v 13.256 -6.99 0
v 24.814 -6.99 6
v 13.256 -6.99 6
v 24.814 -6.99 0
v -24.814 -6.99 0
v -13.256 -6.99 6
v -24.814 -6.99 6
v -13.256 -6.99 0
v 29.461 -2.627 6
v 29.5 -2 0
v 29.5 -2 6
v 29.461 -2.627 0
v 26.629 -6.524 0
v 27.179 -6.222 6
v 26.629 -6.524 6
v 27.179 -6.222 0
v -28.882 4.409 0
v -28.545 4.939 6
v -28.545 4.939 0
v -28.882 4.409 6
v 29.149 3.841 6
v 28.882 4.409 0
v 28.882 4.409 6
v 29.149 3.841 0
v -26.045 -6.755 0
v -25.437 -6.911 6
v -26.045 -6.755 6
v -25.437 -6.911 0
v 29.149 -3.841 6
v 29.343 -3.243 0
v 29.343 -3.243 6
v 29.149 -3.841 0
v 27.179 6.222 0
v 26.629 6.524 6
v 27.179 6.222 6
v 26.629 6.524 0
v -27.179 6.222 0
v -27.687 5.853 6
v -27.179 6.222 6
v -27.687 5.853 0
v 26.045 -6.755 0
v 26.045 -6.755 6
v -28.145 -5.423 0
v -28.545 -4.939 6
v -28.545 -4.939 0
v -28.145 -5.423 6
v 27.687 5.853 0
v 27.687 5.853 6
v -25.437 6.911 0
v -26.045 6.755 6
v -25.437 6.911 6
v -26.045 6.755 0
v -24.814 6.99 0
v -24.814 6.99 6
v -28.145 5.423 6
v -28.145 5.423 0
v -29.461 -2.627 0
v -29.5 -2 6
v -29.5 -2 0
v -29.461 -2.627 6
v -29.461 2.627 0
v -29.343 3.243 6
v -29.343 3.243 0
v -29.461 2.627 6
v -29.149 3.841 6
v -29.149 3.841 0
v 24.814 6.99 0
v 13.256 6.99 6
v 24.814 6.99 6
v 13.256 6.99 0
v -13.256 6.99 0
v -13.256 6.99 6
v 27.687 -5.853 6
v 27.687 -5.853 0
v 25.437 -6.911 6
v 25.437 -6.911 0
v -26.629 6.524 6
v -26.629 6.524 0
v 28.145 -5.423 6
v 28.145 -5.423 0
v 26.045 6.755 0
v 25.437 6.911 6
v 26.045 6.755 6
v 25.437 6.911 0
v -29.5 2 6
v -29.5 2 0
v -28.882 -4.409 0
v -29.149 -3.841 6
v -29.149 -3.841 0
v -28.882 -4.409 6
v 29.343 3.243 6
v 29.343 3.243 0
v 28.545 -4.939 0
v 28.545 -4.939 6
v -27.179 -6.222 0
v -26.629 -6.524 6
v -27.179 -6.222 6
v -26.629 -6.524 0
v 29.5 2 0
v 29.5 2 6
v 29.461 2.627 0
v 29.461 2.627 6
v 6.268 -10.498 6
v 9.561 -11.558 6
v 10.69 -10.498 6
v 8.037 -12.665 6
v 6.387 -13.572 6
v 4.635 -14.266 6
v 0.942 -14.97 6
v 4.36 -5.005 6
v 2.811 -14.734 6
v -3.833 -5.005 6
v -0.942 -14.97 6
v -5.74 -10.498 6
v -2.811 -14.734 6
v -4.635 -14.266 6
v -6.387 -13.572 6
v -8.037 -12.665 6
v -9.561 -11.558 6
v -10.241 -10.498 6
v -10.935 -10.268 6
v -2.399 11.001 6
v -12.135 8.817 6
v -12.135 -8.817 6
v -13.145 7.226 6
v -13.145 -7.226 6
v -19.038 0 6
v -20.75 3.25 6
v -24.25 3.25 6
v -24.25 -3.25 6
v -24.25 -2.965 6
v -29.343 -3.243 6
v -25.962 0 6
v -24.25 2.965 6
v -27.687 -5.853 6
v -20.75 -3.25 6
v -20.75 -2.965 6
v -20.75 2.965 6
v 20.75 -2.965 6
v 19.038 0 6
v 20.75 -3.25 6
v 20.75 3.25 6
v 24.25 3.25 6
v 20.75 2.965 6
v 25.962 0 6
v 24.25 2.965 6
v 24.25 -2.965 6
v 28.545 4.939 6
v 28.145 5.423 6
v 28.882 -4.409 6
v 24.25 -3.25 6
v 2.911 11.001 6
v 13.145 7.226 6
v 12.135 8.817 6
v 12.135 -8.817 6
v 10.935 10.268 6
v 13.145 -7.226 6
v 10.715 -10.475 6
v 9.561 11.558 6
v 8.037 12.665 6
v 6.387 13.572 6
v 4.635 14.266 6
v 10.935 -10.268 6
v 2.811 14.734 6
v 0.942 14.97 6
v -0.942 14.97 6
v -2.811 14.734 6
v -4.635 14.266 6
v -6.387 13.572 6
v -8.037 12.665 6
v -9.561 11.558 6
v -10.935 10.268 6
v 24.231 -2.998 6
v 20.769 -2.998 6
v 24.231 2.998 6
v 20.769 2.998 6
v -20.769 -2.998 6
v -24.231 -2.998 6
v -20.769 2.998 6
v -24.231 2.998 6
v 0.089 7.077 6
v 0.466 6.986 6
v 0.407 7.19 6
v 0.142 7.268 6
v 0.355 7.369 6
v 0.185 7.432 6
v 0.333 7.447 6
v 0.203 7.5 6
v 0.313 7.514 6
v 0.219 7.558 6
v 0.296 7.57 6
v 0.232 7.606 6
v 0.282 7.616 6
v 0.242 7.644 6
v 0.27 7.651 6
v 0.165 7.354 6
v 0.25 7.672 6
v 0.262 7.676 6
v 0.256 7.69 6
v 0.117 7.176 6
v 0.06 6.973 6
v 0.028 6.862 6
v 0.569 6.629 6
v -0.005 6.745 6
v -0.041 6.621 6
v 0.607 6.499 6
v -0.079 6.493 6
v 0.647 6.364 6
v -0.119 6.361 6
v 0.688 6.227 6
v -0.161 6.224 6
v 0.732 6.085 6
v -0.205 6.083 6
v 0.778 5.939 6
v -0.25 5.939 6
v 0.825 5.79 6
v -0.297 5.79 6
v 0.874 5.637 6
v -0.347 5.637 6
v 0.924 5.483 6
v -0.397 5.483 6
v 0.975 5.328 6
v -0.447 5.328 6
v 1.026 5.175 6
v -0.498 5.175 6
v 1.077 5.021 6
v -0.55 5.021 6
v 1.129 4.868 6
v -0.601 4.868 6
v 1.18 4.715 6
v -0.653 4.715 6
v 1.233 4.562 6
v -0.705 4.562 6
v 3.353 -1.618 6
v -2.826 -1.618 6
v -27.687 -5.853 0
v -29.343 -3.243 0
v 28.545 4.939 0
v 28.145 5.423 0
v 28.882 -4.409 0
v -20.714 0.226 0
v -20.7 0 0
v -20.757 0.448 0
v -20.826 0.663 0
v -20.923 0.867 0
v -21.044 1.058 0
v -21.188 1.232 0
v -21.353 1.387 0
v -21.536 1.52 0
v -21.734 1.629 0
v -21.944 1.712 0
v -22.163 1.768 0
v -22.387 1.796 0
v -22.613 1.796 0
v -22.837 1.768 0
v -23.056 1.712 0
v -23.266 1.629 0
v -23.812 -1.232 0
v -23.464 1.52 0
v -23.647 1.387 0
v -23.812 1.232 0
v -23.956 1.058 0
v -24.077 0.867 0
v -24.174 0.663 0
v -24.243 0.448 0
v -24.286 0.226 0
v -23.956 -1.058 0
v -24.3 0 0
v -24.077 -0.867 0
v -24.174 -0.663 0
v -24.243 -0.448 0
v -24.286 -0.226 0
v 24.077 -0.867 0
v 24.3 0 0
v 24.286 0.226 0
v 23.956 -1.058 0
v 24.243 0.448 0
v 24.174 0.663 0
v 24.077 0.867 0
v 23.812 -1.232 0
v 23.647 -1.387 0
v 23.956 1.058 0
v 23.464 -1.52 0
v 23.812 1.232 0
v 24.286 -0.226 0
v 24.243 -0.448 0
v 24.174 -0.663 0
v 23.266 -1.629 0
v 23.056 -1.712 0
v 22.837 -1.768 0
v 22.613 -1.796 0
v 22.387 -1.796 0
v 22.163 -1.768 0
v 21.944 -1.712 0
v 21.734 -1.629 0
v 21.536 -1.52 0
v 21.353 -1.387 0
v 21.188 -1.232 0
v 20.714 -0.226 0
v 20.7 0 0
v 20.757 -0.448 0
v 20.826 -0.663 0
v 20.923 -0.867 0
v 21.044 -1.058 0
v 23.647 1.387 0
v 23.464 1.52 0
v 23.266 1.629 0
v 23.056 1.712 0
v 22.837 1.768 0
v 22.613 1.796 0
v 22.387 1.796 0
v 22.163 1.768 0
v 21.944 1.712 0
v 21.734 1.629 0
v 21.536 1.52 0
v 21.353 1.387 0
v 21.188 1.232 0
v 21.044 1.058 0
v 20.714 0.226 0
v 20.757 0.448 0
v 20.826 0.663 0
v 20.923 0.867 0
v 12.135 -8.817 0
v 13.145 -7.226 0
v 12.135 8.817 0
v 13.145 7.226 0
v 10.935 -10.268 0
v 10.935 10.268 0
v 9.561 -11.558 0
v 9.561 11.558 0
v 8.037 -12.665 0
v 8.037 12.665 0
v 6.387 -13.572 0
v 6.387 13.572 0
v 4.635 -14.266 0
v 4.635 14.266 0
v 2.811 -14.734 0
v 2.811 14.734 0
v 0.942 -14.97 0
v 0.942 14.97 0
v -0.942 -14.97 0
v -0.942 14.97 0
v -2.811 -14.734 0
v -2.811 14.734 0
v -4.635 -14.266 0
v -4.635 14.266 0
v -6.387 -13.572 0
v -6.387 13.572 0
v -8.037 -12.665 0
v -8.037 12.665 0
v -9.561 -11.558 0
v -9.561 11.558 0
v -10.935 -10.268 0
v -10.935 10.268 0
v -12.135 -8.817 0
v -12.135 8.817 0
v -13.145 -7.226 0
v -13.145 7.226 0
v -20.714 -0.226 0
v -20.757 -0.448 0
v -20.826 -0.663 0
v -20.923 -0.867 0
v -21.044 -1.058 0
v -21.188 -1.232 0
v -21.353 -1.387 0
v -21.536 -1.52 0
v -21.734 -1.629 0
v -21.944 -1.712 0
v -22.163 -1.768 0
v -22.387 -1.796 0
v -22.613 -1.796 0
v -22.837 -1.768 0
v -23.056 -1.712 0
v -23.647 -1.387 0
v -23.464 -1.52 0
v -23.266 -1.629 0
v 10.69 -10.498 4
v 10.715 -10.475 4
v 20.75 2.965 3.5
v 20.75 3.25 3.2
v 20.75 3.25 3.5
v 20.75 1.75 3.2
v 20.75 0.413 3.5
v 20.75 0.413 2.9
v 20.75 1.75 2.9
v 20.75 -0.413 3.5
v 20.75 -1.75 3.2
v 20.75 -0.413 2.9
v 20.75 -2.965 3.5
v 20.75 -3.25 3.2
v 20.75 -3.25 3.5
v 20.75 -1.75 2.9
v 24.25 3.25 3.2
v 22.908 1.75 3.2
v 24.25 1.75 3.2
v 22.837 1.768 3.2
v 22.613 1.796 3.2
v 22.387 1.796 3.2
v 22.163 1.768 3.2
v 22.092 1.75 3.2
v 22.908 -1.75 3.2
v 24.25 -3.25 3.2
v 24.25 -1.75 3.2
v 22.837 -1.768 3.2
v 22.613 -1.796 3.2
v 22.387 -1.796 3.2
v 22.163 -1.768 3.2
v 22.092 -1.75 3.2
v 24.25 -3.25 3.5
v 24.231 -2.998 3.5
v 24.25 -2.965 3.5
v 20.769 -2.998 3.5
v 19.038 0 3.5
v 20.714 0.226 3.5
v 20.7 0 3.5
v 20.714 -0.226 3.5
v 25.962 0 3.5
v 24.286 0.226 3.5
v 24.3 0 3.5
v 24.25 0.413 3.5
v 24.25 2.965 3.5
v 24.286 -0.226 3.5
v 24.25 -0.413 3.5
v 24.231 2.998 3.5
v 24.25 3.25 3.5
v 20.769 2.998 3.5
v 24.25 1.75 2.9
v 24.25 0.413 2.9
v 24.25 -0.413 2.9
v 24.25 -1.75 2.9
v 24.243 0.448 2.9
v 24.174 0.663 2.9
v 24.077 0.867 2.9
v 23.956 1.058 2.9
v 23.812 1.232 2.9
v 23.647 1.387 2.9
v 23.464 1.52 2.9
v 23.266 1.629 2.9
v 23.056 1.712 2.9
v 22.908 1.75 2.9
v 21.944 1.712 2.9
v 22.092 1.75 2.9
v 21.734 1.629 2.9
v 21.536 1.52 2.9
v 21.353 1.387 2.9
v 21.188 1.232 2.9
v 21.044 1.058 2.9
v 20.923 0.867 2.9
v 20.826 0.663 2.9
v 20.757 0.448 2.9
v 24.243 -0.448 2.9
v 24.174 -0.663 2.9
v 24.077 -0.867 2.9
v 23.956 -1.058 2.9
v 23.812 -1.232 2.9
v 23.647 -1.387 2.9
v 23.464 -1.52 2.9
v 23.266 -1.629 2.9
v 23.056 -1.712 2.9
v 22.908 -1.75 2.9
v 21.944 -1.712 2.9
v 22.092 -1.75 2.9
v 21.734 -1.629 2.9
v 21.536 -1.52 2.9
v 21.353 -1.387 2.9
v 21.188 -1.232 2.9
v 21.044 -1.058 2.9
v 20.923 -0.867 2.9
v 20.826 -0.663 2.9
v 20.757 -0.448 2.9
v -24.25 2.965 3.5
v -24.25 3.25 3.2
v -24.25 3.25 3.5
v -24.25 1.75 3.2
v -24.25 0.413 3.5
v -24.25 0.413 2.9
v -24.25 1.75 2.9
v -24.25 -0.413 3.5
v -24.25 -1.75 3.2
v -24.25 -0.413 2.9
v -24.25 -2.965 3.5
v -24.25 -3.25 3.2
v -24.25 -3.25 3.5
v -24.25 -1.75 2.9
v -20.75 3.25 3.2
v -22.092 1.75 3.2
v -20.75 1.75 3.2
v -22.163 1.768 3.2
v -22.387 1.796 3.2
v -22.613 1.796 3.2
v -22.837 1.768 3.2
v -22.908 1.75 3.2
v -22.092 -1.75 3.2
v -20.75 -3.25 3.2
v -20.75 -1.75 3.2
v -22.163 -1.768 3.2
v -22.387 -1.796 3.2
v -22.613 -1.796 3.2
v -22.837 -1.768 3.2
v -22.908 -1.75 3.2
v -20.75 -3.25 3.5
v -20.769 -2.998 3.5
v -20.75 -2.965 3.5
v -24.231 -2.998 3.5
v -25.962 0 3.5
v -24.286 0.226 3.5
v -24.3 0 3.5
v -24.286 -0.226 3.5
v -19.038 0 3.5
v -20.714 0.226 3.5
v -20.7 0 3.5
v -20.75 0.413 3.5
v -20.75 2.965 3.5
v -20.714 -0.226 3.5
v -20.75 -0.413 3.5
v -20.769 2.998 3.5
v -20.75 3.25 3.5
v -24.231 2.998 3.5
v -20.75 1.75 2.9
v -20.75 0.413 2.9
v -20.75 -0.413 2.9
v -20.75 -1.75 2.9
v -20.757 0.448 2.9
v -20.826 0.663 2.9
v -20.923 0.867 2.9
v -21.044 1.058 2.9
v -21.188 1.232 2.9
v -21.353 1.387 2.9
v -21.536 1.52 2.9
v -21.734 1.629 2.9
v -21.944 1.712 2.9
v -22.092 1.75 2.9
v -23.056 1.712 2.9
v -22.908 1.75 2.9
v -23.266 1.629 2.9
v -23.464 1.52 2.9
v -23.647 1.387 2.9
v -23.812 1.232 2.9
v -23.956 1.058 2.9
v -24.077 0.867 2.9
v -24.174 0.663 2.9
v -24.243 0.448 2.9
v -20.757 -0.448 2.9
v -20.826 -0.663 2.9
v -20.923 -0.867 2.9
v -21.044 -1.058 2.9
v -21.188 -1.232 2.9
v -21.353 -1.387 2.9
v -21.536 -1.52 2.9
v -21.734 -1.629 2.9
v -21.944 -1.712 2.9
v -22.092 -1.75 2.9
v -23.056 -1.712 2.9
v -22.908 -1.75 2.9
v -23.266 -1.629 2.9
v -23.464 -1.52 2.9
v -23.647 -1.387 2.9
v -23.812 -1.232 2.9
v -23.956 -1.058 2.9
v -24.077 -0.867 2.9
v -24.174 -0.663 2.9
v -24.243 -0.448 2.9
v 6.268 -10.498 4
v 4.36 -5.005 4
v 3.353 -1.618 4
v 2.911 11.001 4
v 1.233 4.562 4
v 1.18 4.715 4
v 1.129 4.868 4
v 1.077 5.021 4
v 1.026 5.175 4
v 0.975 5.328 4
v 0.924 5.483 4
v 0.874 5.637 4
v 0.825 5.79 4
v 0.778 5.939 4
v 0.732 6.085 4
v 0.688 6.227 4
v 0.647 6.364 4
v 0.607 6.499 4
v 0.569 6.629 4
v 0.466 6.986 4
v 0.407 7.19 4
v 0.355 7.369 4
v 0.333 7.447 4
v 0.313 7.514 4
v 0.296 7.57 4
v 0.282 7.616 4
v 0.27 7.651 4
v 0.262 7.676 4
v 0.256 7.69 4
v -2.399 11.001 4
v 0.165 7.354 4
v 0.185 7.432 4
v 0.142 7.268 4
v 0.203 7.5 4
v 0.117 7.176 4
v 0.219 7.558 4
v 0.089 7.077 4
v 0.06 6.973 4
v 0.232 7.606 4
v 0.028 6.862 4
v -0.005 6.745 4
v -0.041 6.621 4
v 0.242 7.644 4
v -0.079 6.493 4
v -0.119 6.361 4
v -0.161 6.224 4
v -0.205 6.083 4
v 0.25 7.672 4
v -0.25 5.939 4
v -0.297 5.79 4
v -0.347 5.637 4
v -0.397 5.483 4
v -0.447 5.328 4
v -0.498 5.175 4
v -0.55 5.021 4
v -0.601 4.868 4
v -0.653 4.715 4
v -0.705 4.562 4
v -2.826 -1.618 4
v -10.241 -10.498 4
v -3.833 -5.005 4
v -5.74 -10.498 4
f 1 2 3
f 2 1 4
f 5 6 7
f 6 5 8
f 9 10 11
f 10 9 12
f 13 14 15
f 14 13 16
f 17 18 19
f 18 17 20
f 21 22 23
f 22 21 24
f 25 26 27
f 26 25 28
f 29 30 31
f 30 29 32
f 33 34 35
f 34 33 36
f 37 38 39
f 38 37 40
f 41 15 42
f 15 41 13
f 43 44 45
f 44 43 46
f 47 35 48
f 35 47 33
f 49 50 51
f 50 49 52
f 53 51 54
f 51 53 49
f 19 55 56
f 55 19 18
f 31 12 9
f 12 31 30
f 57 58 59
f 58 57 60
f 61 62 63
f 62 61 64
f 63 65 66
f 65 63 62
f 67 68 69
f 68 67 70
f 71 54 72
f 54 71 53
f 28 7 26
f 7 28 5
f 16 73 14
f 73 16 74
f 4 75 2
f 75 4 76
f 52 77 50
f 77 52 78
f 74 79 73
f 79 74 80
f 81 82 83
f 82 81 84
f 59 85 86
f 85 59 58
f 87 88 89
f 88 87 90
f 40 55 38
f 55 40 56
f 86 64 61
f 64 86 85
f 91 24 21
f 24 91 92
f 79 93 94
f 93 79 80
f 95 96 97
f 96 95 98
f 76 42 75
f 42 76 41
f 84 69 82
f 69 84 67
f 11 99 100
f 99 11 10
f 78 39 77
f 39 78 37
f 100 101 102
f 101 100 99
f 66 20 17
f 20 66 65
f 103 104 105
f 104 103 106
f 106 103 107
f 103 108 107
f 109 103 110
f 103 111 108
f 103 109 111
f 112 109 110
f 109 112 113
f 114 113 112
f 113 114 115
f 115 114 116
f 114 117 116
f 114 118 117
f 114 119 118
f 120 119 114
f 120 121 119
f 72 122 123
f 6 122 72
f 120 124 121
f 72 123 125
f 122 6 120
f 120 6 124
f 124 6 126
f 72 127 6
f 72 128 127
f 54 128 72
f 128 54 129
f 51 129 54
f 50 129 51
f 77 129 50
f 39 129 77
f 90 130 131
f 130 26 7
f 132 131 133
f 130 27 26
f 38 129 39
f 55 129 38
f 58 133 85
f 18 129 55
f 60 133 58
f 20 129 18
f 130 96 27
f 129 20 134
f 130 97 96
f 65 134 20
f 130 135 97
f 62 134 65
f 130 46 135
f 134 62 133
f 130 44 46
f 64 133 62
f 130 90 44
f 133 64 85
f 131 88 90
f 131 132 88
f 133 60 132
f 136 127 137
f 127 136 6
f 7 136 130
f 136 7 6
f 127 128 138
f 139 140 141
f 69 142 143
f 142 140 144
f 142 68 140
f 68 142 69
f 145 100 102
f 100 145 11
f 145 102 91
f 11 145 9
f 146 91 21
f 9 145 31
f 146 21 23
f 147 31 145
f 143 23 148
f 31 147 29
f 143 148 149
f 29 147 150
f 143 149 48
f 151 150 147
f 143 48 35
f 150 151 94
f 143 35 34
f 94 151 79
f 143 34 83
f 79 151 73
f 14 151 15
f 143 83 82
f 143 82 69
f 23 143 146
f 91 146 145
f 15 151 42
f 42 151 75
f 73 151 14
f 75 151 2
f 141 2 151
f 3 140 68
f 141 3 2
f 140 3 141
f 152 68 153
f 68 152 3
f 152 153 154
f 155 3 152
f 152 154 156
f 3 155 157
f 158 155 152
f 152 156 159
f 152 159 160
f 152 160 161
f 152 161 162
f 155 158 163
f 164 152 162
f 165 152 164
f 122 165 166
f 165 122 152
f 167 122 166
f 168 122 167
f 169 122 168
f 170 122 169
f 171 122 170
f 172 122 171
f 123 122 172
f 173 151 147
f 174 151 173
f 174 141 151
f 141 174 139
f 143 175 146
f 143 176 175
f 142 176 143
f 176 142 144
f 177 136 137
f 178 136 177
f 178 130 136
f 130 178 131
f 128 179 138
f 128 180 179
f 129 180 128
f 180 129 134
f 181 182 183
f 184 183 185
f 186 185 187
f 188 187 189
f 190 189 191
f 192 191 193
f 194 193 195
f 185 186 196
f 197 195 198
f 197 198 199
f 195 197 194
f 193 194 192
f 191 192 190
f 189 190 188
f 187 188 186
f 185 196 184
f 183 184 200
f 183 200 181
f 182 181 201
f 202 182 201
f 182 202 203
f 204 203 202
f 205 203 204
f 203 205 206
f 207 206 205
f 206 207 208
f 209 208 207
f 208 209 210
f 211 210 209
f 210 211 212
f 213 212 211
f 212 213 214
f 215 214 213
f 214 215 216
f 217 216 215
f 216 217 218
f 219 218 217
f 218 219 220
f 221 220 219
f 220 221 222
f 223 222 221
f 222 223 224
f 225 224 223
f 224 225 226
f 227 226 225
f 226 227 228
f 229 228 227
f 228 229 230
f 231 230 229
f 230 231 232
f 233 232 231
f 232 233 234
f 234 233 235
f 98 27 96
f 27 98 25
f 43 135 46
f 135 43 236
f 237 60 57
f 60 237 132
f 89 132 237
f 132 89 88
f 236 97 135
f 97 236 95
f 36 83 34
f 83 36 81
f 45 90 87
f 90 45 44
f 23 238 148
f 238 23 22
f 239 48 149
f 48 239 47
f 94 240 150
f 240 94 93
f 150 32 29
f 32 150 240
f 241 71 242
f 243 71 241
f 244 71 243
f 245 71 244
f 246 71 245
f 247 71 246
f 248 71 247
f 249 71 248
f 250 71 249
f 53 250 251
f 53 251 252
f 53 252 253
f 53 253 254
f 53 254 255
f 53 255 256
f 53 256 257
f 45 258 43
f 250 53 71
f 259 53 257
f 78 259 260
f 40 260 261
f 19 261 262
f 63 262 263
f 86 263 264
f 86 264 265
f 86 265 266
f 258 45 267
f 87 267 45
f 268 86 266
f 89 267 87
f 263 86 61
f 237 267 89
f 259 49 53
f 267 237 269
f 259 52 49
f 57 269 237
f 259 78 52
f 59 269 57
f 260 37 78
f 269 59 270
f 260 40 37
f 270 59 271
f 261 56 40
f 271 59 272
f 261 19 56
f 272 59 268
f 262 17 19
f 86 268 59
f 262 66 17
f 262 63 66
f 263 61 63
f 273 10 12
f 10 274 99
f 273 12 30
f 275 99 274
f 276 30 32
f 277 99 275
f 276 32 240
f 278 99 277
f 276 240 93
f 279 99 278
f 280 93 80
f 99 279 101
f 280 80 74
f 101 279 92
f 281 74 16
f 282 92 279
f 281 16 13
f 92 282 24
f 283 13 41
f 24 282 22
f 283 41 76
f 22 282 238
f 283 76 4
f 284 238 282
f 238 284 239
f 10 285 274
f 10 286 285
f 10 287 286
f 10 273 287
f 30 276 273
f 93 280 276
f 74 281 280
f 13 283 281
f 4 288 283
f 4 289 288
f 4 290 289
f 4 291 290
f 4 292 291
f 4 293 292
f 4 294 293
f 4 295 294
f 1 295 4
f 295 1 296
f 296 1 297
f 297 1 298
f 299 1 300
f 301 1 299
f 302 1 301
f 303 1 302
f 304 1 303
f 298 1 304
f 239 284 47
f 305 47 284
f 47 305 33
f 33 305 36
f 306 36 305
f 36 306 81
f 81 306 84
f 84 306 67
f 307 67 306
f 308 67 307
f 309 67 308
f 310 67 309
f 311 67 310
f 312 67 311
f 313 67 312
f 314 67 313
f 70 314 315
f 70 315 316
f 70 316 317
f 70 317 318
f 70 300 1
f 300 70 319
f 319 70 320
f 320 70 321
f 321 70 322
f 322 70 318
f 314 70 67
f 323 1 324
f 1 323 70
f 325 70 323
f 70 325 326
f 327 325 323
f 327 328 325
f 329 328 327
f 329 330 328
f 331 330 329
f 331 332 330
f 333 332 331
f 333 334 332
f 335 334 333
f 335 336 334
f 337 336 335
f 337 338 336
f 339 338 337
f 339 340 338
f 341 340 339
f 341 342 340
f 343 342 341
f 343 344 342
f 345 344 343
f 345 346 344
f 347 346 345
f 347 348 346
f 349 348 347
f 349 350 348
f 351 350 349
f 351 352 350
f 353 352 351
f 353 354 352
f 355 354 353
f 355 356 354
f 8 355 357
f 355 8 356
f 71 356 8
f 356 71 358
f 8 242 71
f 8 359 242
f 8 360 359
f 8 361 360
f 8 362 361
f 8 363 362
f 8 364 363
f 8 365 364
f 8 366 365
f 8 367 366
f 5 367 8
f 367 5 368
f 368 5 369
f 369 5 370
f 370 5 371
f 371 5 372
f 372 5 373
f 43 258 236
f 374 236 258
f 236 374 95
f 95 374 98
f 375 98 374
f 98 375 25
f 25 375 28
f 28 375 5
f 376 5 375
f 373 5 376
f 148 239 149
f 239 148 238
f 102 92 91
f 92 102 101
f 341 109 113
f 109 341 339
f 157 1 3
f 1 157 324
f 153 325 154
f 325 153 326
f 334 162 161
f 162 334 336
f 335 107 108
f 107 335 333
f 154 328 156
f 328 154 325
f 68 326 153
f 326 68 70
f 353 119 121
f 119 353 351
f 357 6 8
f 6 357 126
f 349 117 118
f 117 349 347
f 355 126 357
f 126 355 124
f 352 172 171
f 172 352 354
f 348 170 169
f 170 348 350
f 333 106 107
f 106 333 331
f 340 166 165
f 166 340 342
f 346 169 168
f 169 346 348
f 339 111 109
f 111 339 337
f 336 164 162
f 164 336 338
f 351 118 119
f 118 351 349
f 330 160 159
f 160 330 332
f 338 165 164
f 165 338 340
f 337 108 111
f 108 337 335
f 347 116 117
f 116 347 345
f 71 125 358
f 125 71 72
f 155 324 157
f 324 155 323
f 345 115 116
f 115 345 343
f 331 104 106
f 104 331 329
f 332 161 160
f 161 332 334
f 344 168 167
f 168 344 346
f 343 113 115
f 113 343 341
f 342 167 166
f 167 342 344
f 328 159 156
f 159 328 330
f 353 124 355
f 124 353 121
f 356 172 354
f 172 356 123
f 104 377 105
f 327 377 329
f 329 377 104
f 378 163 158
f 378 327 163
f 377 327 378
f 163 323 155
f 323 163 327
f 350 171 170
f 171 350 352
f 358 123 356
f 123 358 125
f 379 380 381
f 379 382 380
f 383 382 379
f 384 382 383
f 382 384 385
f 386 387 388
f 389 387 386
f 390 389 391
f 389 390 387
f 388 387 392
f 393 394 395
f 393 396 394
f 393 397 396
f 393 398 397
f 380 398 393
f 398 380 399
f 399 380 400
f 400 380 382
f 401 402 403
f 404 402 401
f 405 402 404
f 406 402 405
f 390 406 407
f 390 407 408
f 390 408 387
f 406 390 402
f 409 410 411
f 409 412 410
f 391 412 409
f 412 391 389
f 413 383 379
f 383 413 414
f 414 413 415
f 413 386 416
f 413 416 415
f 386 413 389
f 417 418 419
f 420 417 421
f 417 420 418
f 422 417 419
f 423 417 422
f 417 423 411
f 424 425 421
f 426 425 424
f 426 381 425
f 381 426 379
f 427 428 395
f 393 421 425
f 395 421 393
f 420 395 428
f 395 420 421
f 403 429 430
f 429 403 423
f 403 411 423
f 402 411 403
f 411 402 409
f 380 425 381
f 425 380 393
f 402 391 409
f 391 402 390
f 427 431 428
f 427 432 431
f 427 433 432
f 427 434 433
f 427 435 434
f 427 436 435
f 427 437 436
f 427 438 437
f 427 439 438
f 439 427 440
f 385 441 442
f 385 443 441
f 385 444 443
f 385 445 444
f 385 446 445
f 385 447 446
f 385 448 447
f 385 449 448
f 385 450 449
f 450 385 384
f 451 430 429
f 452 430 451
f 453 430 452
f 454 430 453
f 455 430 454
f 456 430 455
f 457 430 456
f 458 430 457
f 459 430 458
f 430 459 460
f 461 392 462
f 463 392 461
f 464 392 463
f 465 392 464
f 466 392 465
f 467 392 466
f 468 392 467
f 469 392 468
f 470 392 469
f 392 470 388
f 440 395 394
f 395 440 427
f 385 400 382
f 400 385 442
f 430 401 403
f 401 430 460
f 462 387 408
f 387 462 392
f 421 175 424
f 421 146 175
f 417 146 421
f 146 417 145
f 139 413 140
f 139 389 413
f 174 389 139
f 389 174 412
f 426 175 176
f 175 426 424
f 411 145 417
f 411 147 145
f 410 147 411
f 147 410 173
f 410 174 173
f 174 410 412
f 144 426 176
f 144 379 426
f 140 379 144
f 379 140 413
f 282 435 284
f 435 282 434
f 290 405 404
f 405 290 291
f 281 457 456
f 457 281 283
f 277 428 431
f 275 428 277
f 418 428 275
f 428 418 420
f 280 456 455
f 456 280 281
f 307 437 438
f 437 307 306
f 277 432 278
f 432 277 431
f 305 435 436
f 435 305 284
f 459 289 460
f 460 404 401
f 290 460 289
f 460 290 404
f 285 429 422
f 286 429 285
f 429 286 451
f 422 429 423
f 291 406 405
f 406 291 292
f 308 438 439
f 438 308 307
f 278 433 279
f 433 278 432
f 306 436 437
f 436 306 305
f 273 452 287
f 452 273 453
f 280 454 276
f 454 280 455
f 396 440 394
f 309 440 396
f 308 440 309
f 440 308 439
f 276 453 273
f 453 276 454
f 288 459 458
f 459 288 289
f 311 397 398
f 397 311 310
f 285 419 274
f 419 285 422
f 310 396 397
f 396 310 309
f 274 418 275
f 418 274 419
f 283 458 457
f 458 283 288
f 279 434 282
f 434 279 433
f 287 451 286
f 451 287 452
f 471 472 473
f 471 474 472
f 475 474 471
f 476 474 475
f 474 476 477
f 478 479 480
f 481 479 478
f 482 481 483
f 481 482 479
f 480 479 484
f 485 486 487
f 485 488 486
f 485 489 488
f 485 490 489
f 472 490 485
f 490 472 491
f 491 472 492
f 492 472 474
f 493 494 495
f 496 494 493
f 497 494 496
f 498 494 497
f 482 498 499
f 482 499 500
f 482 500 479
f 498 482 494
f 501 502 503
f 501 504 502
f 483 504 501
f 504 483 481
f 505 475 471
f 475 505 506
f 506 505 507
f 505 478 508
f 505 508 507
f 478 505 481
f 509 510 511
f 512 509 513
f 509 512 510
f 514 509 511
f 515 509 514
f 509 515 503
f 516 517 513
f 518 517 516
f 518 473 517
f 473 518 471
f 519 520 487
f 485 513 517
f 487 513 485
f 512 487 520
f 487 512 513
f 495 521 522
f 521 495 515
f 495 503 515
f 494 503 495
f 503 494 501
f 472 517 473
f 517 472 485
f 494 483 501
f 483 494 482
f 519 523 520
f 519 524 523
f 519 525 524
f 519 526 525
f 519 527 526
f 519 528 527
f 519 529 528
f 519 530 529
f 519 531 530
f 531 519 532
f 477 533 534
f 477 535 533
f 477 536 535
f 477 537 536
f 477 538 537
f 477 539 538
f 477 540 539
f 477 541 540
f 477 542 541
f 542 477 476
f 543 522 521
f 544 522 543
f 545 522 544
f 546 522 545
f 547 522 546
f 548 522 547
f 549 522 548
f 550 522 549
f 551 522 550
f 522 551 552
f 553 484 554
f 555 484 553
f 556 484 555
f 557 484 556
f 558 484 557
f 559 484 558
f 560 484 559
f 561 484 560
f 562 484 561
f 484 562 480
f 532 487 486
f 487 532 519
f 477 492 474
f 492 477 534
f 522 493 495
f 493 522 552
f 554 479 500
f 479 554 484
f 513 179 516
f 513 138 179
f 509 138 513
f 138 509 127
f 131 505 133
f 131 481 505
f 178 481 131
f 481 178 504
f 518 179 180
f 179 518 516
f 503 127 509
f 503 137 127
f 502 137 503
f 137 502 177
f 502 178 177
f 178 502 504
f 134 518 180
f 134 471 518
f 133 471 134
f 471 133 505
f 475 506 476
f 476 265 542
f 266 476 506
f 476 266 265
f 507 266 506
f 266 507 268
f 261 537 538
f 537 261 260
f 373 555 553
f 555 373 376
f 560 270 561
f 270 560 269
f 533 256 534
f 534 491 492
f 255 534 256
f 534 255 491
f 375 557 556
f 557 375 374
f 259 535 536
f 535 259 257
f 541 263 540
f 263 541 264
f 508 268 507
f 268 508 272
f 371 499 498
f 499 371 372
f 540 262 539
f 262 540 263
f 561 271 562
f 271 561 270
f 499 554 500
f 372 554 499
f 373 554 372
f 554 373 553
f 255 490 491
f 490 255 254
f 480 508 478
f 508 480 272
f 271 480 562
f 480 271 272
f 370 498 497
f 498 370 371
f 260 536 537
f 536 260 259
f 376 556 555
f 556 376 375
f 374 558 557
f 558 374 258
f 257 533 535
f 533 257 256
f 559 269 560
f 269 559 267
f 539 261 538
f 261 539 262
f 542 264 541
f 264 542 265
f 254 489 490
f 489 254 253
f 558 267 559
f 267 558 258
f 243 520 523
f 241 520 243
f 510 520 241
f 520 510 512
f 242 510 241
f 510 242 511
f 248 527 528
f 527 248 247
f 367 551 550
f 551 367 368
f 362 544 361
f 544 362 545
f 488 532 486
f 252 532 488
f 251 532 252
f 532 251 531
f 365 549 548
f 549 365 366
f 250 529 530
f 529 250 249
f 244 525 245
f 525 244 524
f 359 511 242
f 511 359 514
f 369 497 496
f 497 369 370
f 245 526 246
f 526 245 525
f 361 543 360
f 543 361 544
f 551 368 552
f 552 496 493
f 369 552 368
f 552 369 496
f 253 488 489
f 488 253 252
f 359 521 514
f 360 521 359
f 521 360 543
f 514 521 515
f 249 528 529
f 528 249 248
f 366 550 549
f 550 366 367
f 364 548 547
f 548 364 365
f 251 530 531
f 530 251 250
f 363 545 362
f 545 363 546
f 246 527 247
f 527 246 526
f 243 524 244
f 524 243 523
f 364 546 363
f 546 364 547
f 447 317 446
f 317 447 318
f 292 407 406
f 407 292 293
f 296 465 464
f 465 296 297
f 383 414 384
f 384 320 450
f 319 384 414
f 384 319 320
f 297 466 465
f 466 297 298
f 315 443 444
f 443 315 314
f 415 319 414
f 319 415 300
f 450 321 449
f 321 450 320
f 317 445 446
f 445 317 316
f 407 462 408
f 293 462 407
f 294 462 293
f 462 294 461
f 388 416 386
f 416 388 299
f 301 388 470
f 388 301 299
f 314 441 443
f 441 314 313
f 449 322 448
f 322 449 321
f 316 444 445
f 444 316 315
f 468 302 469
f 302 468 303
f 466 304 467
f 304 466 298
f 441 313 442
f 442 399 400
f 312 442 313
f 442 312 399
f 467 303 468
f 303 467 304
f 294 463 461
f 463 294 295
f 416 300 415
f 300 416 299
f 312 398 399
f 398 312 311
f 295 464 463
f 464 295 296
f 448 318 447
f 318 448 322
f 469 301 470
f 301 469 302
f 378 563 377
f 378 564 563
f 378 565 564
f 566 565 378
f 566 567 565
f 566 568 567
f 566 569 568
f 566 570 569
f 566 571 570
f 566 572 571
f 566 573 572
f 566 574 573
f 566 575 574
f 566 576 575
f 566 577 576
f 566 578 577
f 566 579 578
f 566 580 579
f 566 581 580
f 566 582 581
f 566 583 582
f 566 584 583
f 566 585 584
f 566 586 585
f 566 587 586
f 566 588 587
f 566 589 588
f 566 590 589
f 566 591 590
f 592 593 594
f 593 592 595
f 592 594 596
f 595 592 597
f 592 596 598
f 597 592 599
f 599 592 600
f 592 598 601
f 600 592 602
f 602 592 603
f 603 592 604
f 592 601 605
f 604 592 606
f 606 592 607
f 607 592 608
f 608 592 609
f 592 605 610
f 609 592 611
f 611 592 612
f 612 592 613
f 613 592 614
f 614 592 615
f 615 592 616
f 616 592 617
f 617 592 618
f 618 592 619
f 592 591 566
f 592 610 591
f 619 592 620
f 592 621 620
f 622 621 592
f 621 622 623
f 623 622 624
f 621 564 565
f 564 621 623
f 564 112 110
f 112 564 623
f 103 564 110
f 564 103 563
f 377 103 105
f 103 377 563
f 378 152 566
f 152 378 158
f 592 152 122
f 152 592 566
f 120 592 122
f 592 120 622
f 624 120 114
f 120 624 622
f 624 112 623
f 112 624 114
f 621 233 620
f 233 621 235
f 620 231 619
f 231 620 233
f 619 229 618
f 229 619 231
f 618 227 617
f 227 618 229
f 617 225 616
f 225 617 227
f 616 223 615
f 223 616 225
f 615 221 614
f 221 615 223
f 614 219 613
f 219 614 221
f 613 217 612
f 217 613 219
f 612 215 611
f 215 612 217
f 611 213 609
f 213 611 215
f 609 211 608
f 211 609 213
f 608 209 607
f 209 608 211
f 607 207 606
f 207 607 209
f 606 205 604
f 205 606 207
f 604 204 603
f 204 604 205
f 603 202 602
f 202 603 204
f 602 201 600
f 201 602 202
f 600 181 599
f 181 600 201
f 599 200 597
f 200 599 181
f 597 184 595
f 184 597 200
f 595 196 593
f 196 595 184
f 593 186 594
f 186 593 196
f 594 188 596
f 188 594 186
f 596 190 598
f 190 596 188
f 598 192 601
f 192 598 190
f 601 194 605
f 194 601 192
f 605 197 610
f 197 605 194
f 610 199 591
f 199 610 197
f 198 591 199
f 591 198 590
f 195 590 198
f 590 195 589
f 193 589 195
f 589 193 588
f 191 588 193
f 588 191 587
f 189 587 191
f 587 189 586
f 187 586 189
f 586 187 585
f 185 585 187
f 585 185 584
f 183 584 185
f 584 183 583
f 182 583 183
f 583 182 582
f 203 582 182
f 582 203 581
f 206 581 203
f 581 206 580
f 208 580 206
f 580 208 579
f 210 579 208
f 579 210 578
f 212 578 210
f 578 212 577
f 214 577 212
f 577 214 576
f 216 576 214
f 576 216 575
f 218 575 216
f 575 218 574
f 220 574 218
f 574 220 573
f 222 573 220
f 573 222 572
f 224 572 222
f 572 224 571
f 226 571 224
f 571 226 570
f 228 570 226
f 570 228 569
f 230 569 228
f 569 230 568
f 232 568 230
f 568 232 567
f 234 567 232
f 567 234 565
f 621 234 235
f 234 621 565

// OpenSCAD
$fn = 50;


difference() {
	union() {
		hull() {
			translate(v = [-24.5000000000, 2.0000000000, 0]) {
				cylinder(h = 6, r = 5);
			}
			translate(v = [24.5000000000, 2.0000000000, 0]) {
				cylinder(h = 6, r = 5);
			}
			translate(v = [-24.5000000000, -2.0000000000, 0]) {
				cylinder(h = 6, r = 5);
			}
			translate(v = [24.5000000000, -2.0000000000, 0]) {
				cylinder(h = 6, r = 5);
			}
		}
		cylinder(h = 6, r = 15.0000000000);
	}
	union() {
		translate(v = [22.5000000000, 0, -20]) {
			rotate(a = [0, 180, 0]) {
				difference() {
					union() {
						translate(v = [0, 0, -26.0000000000]) {
							rotate(a = [0, 0, 0]) {
								difference() {
									union() {
										#translate(v = [-1.7500000000, -3.2500000000, -0.3000000000]) {
											cube(size = [3.5000000000, 6.5000000000, 0.3000000000]);
										}
										#translate(v = [-1.7500000000, -1.7500000000, -0.6000000000]) {
											cube(size = [3.5000000000, 3.5000000000, 0.3000000000]);
										}
										#translate(v = [-1.7500000000, -3.2500000000, 2.5000000000]) {
											cube(size = [3.5000000000, 6.5000000000, 0.3000000000]);
										}
										#translate(v = [-1.7500000000, -1.7500000000, 2.8000000000]) {
											cube(size = [3.5000000000, 3.5000000000, 0.3000000000]);
										}
										#linear_extrude(height = 2.5000000000) {
											polygon(points = [[3.4620000000, 0.0000000000], [1.7310000000, 2.9981799479], [-1.7310000000, 2.9981799479], [-3.4620000000, 0.0000000000], [-1.7310000000, -2.9981799479], [1.7310000000, -2.9981799479]]);
										}
										#translate(v = [-1.7500000000, -3.2500000000, -0.3000000000]) {
											cube(size = [3.5000000000, 6.5000000000, 0.3000000000]);
										}
										#translate(v = [-1.7500000000, -1.7500000000, -0.6000000000]) {
											cube(size = [3.5000000000, 3.5000000000, 0.3000000000]);
										}
										#translate(v = [-1.7500000000, -3.2500000000, 2.5000000000]) {
											cube(size = [3.5000000000, 6.5000000000, 0.3000000000]);
										}
										#translate(v = [-1.7500000000, -1.7500000000, 2.8000000000]) {
											cube(size = [3.5000000000, 3.5000000000, 0.3000000000]);
										}
										#translate(v = [-1.7500000000, -3.2500000000, -0.3000000000]) {
											cube(size = [3.5000000000, 6.5000000000, 0.3000000000]);
										}
										#translate(v = [-1.7500000000, -1.7500000000, -0.6000000000]) {
											cube(size = [3.5000000000, 3.5000000000, 0.3000000000]);
										}
										#translate(v = [-1.7500000000, -3.2500000000, 2.5000000000]) {
											cube(size = [3.5000000000, 6.5000000000, 0.3000000000]);
										}
										#translate(v = [-1.7500000000, -1.7500000000, 2.8000000000]) {
											cube(size = [3.5000000000, 3.5000000000, 0.3000000000]);
										}
									}
									union();
								}
							}
						}
						translate(v = [0, 0, -26.0000000000]) {
							rotate(a = [0, 0, 0]) {
								difference() {
									union() {
										#translate(v = [-1.7500000000, -3.2500000000, -0.3000000000]) {
											cube(size = [3.5000000000, 6.5000000000, 0.3000000000]);
										}
										#translate(v = [-1.7500000000, -1.7500000000, -0.6000000000]) {
											cube(size = [3.5000000000, 3.5000000000, 0.3000000000]);
										}
										#translate(v = [-1.7500000000, -3.2500000000, 2.5000000000]) {
											cube(size = [3.5000000000, 6.5000000000, 0.3000000000]);
										}
										#translate(v = [-1.7500000000, -1.7500000000, 2.8000000000]) {
											cube(size = [3.5000000000, 3.5000000000, 0.3000000000]);
										}
										#linear_extrude(height = 2.5000000000) {
											polygon(points = [[3.4620000000, 0.0000000000], [1.7310000000, 2.9981799479], [-1.7310000000, 2.9981799479], [-3.4620000000, 0.0000000000], [-1.7310000000, -2.9981799479], [1.7310000000, -2.9981799479]]);
										}
										#translate(v = [-1.7500000000, -3.2500000000, -0.3000000000]) {
											cube(size = [3.5000000000, 6.5000000000, 0.3000000000]);
										}
										#translate(v = [-1.7500000000, -1.7500000000, -0.6000000000]) {
											cube(size = [3.5000000000, 3.5000000000, 0.3000000000]);
										}
										#translate(v = [-1.7500000000, -3.2500000000, 2.5000000000]) {
											cube(size = [3.5000000000, 6.5000000000, 0.3000000000]);
										}
										#translate(v = [-1.7500000000, -1.7500000000, 2.8000000000]) {
											cube(size = [3.5000000000, 3.5000000000, 0.3000000000]);
										}
										#translate(v = [-1.7500000000, -3.2500000000, -0.3000000000]) {
											cube(size = [3.5000000000, 6.5000000000, 0.3000000000]);
										}
										#translate(v = [-1.7500000000, -1.7500000000, -0.6000000000]) {
											cube(size = [3.5000000000, 3.5000000000, 0.3000000000]);
										}
										#translate(v = [-1.7500000000, -3.2500000000, 2.5000000000]) {
											cube(size = [3.5000000000, 6.5000000000, 0.3000000000]);
										}
										#translate(v = [-1.7500000000, -1.7500000000, 2.8000000000]) {
											cube(size = [3.5000000000, 3.5000000000, 0.3000000000]);
										}
									}
									union();
								}
							}
						}
						translate(v = [0, 0, -26.0000000000]) {
							rotate(a = [0, 0, 0]) {
								difference() {
									union() {
										#translate(v = [-1.7500000000, -3.2500000000, -0.3000000000]) {
											cube(size = [3.5000000000, 6.5000000000, 0.3000000000]);
										}
										#translate(v = [-1.7500000000, -1.7500000000, -0.6000000000]) {
											cube(size = [3.5000000000, 3.5000000000, 0.3000000000]);
										}
										#translate(v = [-1.7500000000, -3.2500000000, 2.5000000000]) {
											cube(size = [3.5000000000, 6.5000000000, 0.3000000000]);
										}
										#translate(v = [-1.7500000000, -1.7500000000, 2.8000000000]) {
											cube(size = [3.5000000000, 3.5000000000, 0.3000000000]);
										}
										#linear_extrude(height = 2.5000000000) {
											polygon(points = [[3.4620000000, 0.0000000000], [1.7310000000, 2.9981799479], [-1.7310000000, 2.9981799479], [-3.4620000000, 0.0000000000], [-1.7310000000, -2.9981799479], [1.7310000000, -2.9981799479]]);
										}
										#translate(v = [-1.7500000000, -3.2500000000, -0.3000000000]) {
											cube(size = [3.5000000000, 6.5000000000, 0.3000000000]);
										}
										#translate(v = [-1.7500000000, -1.7500000000, -0.6000000000]) {
											cube(size = [3.5000000000, 3.5000000000, 0.3000000000]);
										}
										#translate(v = [-1.7500000000, -3.2500000000, 2.5000000000]) {
											cube(size = [3.5000000000, 6.5000000000, 0.3000000000]);
										}
										#translate(v = [-1.7500000000, -1.7500000000, 2.8000000000]) {
											cube(size = [3.5000000000, 3.5000000000, 0.3000000000]);
										}
										#translate(v = [-1.7500000000, -3.2500000000, -0.3000000000]) {
											cube(size = [3.5000000000, 6.5000000000, 0.3000000000]);
										}
										#translate(v = [-1.7500000000, -1.7500000000, -0.6000000000]) {
											cube(size = [3.5000000000, 3.5000000000, 0.3000000000]);
										}
										#translate(v = [-1.7500000000, -3.2500000000, 2.5000000000]) {
											cube(size = [3.5000000000, 6.5000000000, 0.3000000000]);
										}
										#translate(v = [-1.7500000000, -1.7500000000, 2.8000000000]) {
											cube(size = [3.5000000000, 3.5000000000, 0.3000000000]);
										}
									}
									union();
								}
							}
						}
						#translate(v = [0, 0, -26.0000000000]) {
							cylinder(h = 26, r = 1.5000000000);
						}
						#translate(v = [0, 0, -1.9000000000]) {
							cylinder(h = 1.9000000000, r1 = 1.8000000000, r2 = 3.6000000000);
						}
						#translate(v = [0, 0, -26.0000000000]) {
							cylinder(h = 26, r = 1.8000000000);
						}
						#translate(v = [0, 0, -26.0000000000]) {
							cylinder(h = 26, r = 1.5000000000);
						}
					}
					union();
				}
			}
		}
		translate(v = [-22.5000000000, 0, -20]) {
			rotate(a = [0, 180, 0]) {
				difference() {
					union() {
						translate(v = [0, 0, -26.0000000000]) {
							rotate(a = [0, 0, 0]) {
								difference() {
									union() {
										#translate(v = [-1.7500000000, -3.2500000000, -0.3000000000]) {
											cube(size = [3.5000000000, 6.5000000000, 0.3000000000]);
										}
										#translate(v = [-1.7500000000, -1.7500000000, -0.6000000000]) {
											cube(size = [3.5000000000, 3.5000000000, 0.3000000000]);
										}
										#translate(v = [-1.7500000000, -3.2500000000, 2.5000000000]) {
											cube(size = [3.5000000000, 6.5000000000, 0.3000000000]);
										}
										#translate(v = [-1.7500000000, -1.7500000000, 2.8000000000]) {
											cube(size = [3.5000000000, 3.5000000000, 0.3000000000]);
										}
										#linear_extrude(height = 2.5000000000) {
											polygon(points = [[3.4620000000, 0.0000000000], [1.7310000000, 2.9981799479], [-1.7310000000, 2.9981799479], [-3.4620000000, 0.0000000000], [-1.7310000000, -2.9981799479], [1.7310000000, -2.9981799479]]);
										}
										#translate(v = [-1.7500000000, -3.2500000000, -0.3000000000]) {
											cube(size = [3.5000000000, 6.5000000000, 0.3000000000]);
										}
										#translate(v = [-1.7500000000, -1.7500000000, -0.6000000000]) {
											cube(size = [3.5000000000, 3.5000000000, 0.3000000000]);
										}
										#translate(v = [-1.7500000000, -3.2500000000, 2.5000000000]) {
											cube(size = [3.5000000000, 6.5000000000, 0.3000000000]);
										}
										#translate(v = [-1.7500000000, -1.7500000000, 2.8000000000]) {
											cube(size = [3.5000000000, 3.5000000000, 0.3000000000]);
										}
										#translate(v = [-1.7500000000, -3.2500000000, -0.3000000000]) {
											cube(size = [3.5000000000, 6.5000000000, 0.3000000000]);
										}
										#translate(v = [-1.7500000000, -1.7500000000, -0.6000000000]) {
											cube(size = [3.5000000000, 3.5000000000, 0.3000000000]);
										}
										#translate(v = [-1.7500000000, -3.2500000000, 2.5000000000]) {
											cube(size = [3.5000000000, 6.5000000000, 0.3000000000]);
										}
										#translate(v = [-1.7500000000, -1.7500000000, 2.8000000000]) {
											cube(size = [3.5000000000, 3.5000000000, 0.3000000000]);
										}
									}
									union();
								}
							}
						}
						translate(v = [0, 0, -26.0000000000]) {
							rotate(a = [0, 0, 0]) {
								difference() {
									union() {
										#translate(v = [-1.7500000000, -3.2500000000, -0.3000000000]) {
											cube(size = [3.5000000000, 6.5000000000, 0.3000000000]);
										}
										#translate(v = [-1.7500000000, -1.7500000000, -0.6000000000]) {
											cube(size = [3.5000000000, 3.5000000000, 0.3000000000]);
										}
										#translate(v = [-1.7500000000, -3.2500000000, 2.5000000000]) {
											cube(size = [3.5000000000, 6.5000000000, 0.3000000000]);
										}
										#translate(v = [-1.7500000000, -1.7500000000, 2.8000000000]) {
											cube(size = [3.5000000000, 3.5000000000, 0.3000000000]);
										}
										#linear_extrude(height = 2.5000000000) {
											polygon(points = [[3.4620000000, 0.0000000000], [1.7310000000, 2.9981799479], [-1.7310000000, 2.9981799479], [-3.4620000000, 0.0000000000], [-1.7310000000, -2.9981799479], [1.7310000000, -2.9981799479]]);
										}
										#translate(v = [-1.7500000000, -3.2500000000, -0.3000000000]) {
											cube(size = [3.5000000000, 6.5000000000, 0.3000000000]);
										}
										#translate(v = [-1.7500000000, -1.7500000000, -0.6000000000]) {
											cube(size = [3.5000000000, 3.5000000000, 0.3000000000]);
										}
										#translate(v = [-1.7500000000, -3.2500000000, 2.5000000000]) {
											cube(size = [3.5000000000, 6.5000000000, 0.3000000000]);
										}
										#translate(v = [-1.7500000000, -1.7500000000, 2.8000000000]) {
											cube(size = [3.5000000000, 3.5000000000, 0.3000000000]);
										}
										#translate(v = [-1.7500000000, -3.2500000000, -0.3000000000]) {
											cube(size = [3.5000000000, 6.5000000000, 0.3000000000]);
										}
										#translate(v = [-1.7500000000, -1.7500000000, -0.6000000000]) {
											cube(size = [3.5000000000, 3.5000000000, 0.3000000000]);
										}
										#translate(v = [-1.7500000000, -3.2500000000, 2.5000000000]) {
											cube(size = [3.5000000000, 6.5000000000, 0.3000000000]);
										}
										#translate(v = [-1.7500000000, -1.7500000000, 2.8000000000]) {
											cube(size = [3.5000000000, 3.5000000000, 0.3000000000]);
										}
									}
									union();
								}
							}
						}
						translate(v = [0, 0, -26.0000000000]) {
							rotate(a = [0, 0, 0]) {
								difference() {
									union() {
										#translate(v = [-1.7500000000, -3.2500000000, -0.3000000000]) {
											cube(size = [3.5000000000, 6.5000000000, 0.3000000000]);
										}
										#translate(v = [-1.7500000000, -1.7500000000, -0.6000000000]) {
											cube(size = [3.5000000000, 3.5000000000, 0.3000000000]);
										}
										#translate(v = [-1.7500000000, -3.2500000000, 2.5000000000]) {
											cube(size = [3.5000000000, 6.5000000000, 0.3000000000]);
										}
										#translate(v = [-1.7500000000, -1.7500000000, 2.8000000000]) {
											cube(size = [3.5000000000, 3.5000000000, 0.3000000000]);
										}
										#linear_extrude(height = 2.5000000000) {
											polygon(points = [[3.4620000000, 0.0000000000], [1.7310000000, 2.9981799479], [-1.7310000000, 2.9981799479], [-3.4620000000, 0.0000000000], [-1.7310000000, -2.9981799479], [1.7310000000, -2.9981799479]]);
										}
										#translate(v = [-1.7500000000, -3.2500000000, -0.3000000000]) {
											cube(size = [3.5000000000, 6.5000000000, 0.3000000000]);
										}
										#translate(v = [-1.7500000000, -1.7500000000, -0.6000000000]) {
											cube(size = [3.5000000000, 3.5000000000, 0.3000000000]);
										}
										#translate(v = [-1.7500000000, -3.2500000000, 2.5000000000]) {
											cube(size = [3.5000000000, 6.5000000000, 0.3000000000]);
										}
										#translate(v = [-1.7500000000, -1.7500000000, 2.8000000000]) {
											cube(size = [3.5000000000, 3.5000000000, 0.3000000000]);
										}
										#translate(v = [-1.7500000000, -3.2500000000, -0.3000000000]) {
											cube(size = [3.5000000000, 6.5000000000, 0.3000000000]);
										}
										#translate(v = [-1.7500000000, -1.7500000000, -0.6000000000]) {
											cube(size = [3.5000000000, 3.5000000000, 0.3000000000]);
										}
										#translate(v = [-1.7500000000, -3.2500000000, 2.5000000000]) {
											cube(size = [3.5000000000, 6.5000000000, 0.3000000000]);
										}
										#translate(v = [-1.7500000000, -1.7500000000, 2.8000000000]) {
											cube(size = [3.5000000000, 3.5000000000, 0.3000000000]);
										}
									}
									union();
								}
							}
						}
						#translate(v = [0, 0, -26.0000000000]) {
							cylinder(h = 26, r = 1.5000000000);
						}
						#translate(v = [0, 0, -1.9000000000]) {
							cylinder(h = 1.9000000000, r1 = 1.8000000000, r2 = 3.6000000000);
						}
						#translate(v = [0, 0, -26.0000000000]) {
							cylinder(h = 26, r = 1.8000000000);
						}
						#translate(v = [0, 0, -26.0000000000]) {
							cylinder(h = 26, r = 1.5000000000);
						}
					}
					union();
				}
			}
		}
		translate(v = [-22.5000000000, 0.0000000000, 0]) {
			cylinder(h = 6, r = 1.8000000000);
		}
		translate(v = [22.5000000000, 0.0000000000, 0]) {
			cylinder(h = 6, r = 1.8000000000);
		}
		translate(v = [-22.5000000000, 0.0000000000, 0]) {
			cylinder(h = 6, r = 1.8000000000);
		}
		translate(v = [22.5000000000, 0.0000000000, 0]) {
			cylinder(h = 6, r = 1.8000000000);
		}
		translate(v = [-22.5000000000, 0.0000000000, 0]) {
			cylinder(h = 6, r = 1.8000000000);
		}
		translate(v = [22.5000000000, 0.0000000000, 0]) {
			cylinder(h = 6, r = 1.8000000000);
		}
		translate(v = [-22.5000000000, 0.0000000000, 0]) {
			cylinder(h = 6, r = 1.8000000000);
		}
		translate(v = [22.5000000000, 0.0000000000, 0]) {
			cylinder(h = 6, r = 1.8000000000);
		}
		#translate(v = [0, 0, 4]) {
			linear_extrude(height = 2) {
				text(font = "Arial:Bold", halign = "center", size = 22.5000000000, text = "A", valign = "center");
			}
		}
	}
}
